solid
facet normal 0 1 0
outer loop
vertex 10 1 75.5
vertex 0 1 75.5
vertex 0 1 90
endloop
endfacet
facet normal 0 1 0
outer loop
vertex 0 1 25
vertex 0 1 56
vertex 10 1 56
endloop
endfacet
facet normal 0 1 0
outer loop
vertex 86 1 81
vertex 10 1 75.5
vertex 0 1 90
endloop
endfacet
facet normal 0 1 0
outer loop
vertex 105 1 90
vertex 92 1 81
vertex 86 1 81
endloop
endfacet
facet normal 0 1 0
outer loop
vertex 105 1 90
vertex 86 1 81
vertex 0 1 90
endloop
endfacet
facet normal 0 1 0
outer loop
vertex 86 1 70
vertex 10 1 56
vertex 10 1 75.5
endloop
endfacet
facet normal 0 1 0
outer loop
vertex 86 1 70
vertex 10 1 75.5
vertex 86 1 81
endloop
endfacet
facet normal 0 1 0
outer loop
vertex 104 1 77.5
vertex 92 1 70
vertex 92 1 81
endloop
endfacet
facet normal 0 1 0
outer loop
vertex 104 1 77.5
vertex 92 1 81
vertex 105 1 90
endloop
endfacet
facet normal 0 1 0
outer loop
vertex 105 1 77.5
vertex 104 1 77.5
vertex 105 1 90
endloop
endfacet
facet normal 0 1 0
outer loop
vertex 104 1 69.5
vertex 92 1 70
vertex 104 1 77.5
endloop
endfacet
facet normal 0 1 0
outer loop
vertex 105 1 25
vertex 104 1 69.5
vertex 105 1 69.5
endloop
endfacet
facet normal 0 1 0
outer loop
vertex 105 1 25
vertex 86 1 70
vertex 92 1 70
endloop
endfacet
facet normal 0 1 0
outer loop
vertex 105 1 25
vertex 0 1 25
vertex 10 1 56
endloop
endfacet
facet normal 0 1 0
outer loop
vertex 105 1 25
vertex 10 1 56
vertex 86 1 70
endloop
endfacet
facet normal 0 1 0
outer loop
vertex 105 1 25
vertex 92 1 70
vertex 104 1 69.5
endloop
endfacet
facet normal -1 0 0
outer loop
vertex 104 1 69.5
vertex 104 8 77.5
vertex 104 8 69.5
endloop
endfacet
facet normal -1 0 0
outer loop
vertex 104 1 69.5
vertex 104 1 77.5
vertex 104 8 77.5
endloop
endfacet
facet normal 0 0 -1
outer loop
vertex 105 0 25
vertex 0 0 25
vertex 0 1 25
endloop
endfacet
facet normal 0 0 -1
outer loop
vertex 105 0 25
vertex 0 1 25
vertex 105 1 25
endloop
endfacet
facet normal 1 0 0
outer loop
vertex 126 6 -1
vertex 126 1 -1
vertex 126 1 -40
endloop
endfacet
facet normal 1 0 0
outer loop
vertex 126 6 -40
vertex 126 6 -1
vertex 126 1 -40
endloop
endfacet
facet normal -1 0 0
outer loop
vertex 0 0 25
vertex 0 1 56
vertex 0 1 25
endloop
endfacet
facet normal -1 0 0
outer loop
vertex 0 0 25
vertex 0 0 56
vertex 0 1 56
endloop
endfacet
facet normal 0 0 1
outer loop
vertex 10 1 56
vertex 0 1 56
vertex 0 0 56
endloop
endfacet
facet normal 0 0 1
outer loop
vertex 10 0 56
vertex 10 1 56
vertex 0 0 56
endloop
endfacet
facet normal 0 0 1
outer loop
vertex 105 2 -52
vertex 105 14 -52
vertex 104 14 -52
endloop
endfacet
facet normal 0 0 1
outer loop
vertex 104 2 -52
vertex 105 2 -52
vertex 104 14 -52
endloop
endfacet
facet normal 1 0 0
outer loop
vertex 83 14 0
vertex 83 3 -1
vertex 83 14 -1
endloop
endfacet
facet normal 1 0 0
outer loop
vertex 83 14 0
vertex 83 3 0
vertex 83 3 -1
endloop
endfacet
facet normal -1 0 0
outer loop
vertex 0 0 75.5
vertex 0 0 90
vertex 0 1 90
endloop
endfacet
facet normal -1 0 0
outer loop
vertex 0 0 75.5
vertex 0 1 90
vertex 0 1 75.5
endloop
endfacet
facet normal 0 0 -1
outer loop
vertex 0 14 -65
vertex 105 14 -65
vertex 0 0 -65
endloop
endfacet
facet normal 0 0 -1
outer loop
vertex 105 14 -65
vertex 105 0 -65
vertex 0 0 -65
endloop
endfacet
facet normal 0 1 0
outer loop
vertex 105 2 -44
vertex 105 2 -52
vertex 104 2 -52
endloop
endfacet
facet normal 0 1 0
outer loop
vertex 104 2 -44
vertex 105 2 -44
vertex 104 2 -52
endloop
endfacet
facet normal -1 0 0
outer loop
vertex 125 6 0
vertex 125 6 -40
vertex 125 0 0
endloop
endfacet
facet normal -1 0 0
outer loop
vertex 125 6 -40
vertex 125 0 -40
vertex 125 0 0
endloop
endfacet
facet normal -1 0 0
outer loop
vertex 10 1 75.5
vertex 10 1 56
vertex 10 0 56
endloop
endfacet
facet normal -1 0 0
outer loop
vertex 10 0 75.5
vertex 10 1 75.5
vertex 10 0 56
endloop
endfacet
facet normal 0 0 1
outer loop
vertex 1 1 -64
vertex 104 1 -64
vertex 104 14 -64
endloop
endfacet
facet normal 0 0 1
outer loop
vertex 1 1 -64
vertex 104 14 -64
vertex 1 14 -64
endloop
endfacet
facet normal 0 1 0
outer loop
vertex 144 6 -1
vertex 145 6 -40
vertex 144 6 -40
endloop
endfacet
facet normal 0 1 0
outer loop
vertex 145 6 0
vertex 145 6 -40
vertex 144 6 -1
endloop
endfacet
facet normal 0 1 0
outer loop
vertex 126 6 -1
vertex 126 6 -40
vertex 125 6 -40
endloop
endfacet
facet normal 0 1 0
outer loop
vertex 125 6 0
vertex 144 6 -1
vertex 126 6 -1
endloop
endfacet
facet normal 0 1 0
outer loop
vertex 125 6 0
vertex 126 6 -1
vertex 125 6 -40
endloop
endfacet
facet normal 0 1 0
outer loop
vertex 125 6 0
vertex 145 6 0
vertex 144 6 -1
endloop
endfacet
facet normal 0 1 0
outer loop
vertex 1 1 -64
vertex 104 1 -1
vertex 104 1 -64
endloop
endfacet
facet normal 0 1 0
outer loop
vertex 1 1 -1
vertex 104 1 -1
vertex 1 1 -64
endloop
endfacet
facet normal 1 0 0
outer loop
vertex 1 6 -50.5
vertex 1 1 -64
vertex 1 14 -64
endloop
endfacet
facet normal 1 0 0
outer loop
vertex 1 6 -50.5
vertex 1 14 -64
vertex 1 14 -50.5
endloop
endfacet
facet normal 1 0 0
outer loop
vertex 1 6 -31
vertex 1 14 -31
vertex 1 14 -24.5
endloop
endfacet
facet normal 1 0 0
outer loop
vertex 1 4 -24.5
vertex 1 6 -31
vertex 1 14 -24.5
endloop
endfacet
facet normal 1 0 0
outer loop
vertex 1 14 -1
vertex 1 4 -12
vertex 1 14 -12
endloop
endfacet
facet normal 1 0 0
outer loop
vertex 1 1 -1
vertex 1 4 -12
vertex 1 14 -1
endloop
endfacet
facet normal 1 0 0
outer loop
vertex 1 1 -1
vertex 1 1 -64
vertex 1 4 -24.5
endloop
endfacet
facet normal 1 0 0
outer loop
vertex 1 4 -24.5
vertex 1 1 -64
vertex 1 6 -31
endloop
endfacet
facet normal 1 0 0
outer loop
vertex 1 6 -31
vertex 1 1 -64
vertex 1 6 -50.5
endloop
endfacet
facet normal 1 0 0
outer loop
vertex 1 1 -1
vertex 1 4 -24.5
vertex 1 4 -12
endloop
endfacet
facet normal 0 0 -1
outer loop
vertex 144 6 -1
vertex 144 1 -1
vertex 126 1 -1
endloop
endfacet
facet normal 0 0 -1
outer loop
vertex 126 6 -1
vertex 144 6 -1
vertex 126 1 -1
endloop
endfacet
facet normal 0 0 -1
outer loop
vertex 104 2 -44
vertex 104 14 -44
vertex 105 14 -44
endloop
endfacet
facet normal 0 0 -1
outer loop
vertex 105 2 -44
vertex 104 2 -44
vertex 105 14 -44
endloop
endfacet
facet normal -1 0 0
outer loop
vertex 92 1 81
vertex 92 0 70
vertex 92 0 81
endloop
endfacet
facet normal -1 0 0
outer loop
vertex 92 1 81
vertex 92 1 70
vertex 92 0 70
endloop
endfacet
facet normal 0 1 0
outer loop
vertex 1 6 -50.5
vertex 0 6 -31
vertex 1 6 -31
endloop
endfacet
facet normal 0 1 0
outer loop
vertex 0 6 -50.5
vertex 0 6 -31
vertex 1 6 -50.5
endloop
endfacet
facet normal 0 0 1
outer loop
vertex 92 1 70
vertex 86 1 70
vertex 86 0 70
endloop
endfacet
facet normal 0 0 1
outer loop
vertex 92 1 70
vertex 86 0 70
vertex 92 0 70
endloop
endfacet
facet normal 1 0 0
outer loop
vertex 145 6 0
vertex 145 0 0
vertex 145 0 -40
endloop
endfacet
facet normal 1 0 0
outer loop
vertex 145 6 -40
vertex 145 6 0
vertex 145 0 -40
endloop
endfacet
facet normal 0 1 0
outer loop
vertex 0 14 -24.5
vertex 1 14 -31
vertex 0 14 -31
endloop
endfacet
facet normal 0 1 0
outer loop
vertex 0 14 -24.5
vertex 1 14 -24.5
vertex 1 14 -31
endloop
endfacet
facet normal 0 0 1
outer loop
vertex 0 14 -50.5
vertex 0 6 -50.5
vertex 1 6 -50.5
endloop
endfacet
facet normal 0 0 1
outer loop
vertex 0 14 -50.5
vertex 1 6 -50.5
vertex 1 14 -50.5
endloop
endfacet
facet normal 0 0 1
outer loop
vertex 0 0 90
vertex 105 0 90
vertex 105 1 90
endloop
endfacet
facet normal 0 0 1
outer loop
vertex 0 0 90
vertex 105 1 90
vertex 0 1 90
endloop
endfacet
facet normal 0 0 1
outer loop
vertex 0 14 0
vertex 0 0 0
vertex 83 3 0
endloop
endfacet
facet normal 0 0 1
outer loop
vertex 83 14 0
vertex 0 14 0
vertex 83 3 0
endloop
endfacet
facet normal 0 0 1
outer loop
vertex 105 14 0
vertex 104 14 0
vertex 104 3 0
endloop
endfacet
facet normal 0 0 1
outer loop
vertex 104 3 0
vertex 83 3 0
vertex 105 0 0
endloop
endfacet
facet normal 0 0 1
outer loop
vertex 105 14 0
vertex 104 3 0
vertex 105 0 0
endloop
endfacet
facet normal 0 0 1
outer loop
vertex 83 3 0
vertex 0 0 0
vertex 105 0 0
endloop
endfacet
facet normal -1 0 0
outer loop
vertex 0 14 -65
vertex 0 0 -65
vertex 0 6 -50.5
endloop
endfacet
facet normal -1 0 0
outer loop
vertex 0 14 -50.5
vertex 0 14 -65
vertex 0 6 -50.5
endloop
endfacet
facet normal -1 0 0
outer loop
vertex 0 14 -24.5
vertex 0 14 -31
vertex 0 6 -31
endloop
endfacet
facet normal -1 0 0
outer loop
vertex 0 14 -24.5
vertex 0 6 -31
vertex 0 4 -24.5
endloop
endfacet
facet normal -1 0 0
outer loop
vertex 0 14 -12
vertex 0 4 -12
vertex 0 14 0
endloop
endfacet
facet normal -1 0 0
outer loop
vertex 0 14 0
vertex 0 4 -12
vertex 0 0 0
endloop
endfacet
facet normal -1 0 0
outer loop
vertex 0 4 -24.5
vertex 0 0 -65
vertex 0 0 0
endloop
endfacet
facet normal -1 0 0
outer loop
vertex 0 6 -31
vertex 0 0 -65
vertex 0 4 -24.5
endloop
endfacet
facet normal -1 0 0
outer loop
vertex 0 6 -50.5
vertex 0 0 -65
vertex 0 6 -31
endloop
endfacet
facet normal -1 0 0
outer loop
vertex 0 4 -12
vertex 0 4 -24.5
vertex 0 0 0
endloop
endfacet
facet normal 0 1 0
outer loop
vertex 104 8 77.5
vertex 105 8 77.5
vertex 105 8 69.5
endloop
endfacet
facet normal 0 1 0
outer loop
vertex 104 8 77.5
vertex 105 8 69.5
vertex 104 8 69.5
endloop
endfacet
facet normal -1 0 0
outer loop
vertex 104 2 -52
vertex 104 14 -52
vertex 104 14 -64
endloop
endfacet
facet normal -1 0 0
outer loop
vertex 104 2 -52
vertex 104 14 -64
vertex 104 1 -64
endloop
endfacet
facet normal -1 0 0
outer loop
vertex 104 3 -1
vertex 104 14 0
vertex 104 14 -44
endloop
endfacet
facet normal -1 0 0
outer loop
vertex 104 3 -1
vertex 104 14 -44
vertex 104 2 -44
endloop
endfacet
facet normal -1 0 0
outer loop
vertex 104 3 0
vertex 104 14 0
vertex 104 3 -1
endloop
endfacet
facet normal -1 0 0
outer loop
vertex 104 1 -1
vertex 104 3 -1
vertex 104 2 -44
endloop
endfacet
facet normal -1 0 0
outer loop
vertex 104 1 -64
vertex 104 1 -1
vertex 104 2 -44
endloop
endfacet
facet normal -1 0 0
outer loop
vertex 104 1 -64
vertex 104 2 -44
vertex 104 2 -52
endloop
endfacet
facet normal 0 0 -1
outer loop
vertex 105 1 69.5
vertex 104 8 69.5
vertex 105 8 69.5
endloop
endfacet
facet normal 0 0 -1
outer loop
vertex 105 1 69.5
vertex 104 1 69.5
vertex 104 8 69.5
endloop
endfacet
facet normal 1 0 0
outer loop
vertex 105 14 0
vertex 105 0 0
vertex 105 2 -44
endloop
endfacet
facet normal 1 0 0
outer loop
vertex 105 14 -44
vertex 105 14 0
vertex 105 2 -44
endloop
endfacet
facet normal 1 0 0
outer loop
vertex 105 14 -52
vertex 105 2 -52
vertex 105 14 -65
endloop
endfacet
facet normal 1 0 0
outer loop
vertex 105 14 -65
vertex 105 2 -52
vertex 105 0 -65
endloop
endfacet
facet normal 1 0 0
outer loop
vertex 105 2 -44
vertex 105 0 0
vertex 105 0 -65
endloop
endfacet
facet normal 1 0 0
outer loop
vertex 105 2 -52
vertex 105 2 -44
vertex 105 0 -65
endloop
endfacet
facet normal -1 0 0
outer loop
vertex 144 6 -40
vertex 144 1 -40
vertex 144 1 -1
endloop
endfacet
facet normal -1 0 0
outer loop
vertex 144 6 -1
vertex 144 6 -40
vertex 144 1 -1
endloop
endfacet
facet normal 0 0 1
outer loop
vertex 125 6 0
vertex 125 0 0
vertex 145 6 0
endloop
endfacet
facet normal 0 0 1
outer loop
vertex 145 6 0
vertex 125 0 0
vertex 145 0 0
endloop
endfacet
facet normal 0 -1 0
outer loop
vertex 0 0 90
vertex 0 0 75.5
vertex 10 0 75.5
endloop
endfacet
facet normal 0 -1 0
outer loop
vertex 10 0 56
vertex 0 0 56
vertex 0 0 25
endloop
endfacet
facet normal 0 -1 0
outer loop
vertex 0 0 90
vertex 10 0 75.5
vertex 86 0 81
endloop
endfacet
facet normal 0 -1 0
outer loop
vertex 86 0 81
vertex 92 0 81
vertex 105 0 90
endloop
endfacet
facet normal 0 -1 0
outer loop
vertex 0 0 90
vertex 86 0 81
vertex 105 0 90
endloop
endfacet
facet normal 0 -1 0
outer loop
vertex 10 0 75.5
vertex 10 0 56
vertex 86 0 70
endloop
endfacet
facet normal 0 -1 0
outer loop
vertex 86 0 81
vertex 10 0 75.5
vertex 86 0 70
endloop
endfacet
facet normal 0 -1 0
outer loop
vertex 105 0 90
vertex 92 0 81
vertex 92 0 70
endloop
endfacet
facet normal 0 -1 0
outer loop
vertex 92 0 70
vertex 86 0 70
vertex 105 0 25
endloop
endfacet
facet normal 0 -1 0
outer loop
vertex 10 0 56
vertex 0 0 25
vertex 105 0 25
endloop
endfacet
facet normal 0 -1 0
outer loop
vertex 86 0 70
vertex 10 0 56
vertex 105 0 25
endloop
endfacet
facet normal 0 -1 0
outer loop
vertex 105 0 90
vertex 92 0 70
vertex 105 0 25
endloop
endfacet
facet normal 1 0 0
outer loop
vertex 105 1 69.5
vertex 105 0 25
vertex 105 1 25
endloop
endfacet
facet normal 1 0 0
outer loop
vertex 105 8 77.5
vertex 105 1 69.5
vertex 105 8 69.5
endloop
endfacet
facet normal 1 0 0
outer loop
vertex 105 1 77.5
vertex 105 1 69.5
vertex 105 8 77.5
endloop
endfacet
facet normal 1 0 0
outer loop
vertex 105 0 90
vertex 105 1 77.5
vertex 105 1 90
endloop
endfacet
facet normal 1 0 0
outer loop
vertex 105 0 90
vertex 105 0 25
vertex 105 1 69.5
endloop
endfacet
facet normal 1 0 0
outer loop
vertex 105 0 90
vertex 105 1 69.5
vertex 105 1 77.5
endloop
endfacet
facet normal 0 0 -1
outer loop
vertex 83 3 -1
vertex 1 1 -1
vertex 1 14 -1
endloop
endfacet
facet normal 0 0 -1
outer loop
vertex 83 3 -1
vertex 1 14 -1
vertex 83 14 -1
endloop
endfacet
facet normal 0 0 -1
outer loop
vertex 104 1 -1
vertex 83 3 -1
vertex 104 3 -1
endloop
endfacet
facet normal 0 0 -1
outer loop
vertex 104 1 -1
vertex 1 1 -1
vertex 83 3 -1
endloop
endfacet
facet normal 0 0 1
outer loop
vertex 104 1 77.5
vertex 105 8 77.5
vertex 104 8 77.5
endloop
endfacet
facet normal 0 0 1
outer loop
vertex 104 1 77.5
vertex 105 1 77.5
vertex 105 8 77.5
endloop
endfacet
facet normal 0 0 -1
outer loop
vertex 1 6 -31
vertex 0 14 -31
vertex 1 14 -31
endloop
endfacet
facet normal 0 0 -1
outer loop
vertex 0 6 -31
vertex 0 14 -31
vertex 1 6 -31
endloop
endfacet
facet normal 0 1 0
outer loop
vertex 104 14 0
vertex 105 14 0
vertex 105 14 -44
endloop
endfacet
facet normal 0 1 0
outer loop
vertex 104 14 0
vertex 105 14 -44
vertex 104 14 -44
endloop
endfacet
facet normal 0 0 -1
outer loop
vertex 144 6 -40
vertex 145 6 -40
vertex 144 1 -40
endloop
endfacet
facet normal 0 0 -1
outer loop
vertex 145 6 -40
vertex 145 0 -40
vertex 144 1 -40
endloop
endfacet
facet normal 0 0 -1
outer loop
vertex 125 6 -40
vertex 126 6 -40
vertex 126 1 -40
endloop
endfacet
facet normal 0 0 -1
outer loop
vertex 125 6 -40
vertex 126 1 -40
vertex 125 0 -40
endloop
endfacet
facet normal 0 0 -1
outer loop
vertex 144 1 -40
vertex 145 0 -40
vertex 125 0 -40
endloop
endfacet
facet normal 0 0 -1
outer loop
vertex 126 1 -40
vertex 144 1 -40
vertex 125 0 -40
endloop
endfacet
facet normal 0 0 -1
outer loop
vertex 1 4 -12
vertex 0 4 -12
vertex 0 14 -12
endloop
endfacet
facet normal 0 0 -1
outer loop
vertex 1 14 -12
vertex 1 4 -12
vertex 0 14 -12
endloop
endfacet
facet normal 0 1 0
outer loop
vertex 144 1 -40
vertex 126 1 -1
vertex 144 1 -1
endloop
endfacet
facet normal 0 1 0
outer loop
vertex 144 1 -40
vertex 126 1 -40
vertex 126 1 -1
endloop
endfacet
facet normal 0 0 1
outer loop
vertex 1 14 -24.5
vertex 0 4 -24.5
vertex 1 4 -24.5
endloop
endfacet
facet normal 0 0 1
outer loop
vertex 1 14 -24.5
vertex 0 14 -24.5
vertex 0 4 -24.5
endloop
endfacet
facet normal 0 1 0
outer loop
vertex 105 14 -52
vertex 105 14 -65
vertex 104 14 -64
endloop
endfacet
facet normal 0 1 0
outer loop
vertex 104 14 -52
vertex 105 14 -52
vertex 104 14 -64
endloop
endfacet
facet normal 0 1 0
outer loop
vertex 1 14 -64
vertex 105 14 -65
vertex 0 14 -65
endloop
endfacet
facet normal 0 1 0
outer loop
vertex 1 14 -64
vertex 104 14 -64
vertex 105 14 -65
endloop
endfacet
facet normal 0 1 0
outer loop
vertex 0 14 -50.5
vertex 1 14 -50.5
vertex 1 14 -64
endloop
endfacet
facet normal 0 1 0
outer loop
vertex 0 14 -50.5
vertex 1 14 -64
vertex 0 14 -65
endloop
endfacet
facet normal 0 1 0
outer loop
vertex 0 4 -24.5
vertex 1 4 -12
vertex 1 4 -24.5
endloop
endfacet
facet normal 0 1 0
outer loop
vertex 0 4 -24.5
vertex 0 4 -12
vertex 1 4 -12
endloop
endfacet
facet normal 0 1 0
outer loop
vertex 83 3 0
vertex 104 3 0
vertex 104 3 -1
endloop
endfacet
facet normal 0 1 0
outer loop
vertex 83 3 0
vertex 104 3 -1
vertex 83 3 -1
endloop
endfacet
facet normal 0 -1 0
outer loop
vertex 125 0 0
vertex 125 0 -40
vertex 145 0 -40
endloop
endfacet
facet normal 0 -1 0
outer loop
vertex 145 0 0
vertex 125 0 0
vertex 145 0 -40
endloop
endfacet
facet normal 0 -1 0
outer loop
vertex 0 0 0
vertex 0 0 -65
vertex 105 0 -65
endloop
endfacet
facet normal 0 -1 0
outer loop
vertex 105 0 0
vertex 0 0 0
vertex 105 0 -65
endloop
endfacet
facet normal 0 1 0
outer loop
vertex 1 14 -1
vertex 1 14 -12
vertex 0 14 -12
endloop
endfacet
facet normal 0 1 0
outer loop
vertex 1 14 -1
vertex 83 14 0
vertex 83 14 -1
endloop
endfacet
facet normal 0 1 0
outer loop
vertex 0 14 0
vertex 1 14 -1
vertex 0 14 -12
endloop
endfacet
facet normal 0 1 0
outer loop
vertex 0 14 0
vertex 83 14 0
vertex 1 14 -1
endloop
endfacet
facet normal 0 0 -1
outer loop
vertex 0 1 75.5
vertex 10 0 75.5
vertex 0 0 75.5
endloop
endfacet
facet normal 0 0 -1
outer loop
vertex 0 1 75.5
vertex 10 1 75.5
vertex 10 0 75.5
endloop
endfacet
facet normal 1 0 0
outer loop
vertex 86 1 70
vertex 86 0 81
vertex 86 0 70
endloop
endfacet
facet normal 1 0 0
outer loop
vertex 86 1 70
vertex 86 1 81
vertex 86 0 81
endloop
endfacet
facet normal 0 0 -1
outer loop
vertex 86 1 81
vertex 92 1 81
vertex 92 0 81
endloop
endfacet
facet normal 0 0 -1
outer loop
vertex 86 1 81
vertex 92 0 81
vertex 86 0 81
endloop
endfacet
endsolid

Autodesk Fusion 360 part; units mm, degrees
sketch "草图1" plane through (0, 0, 0) normal (0, 1, 0) x (1, 0, 0)
  line L0 (0, 0) -> (105, 0)
  line L1 (105, 0) -> (105, 65)
  line L2 (105, 65) -> (0, 65)
  line L3 (0, 65) -> (0, 0)
extrude "拉伸1" add sketch "草图1" along normal blind 1 makes body 1
sketch "草图2" plane through (0, 1, 0) normal (0, 1, 0) x (-1, 0, 0)
  line L0 (0, -65) -> (0, 0)
  line L1 (0, 0) -> (-105, 0)
  line L2 (-105, 0) -> (-105, -65)
  line L3 (-105, -65) -> (0, -65)
  line L4 (-1, -1) -> (-104, -1)
  line L5 (-104, -1) -> (-104, -64)
  line L6 (-104, -64) -> (-1, -64)
  line L7 (-1, -64) -> (-1, -1)
extrude "拉伸2" add sketch "草图2" along normal blind 13 bodies 1
sketch "草图3" plane through (0, 0, 0) normal (0, 0, 1) x (1, 0, 0)
  line L0 (0, 0) -> (105, 0)
  line L1 (105, 0) -> (105, 14)
  line L2 (105, 14) -> (0, 14)
  line L3 (0, 14) -> (0, 0)
  line L4 (104, 1) -> (83, 1)
  line L5 (83, 1) -> (83, 14)
  line L6 (83, 14) -> (104, 14)
  line L7 (104, 14) -> (104, 1)
  dimension "d5" = 21
extrude "拉伸3" cut sketch "草图3" against normal blind 1 contours L2 L4 L5 L6 L7 bodies 1
sketch "草图4" plane through (0, 0, 0) normal (-1, 0, 0) x (0, 0, 1)
  line L0 (-65, 0) -> (0, 0)
  line L1 (0, 0) -> (0, 14)
  line L2 (0, 14) -> (-65, 14)
  line L3 (-65, 14) -> (-65, 0)
  line L4 (-12, 6) -> (-22, 6)
  line L5 (-22, 6) -> (-22, 11)
  line L6 (-22, 11) -> (-12, 11)
  line L7 (-12, 11) -> (-12, 6)
  line L8 (-22, 11) -> (-12, 11)
  line L9 (-12, 11) -> (-12, 14)
  line L10 (-12, 14) -> (-22, 14)
  line L11 (-22, 14) -> (-22, 11)
  line L12 (-31, 6) -> (-48, 6)
  line L13 (-48, 6) -> (-48, 14)
  line L14 (-48, 14) -> (-31, 14)
  line L15 (-31, 14) -> (-31, 6)
extrude "拉伸4" cut sketch "草图4" against normal blind 1 contours L2 L12 L13 L14 L15 | L2 L6 L8 L9 L10 L11 | L4 L5 L6 L7 L8 bodies 1
sketch "草图5" plane through (0, 0, 0) normal (0, 1, 0) x (1, 0, 0)
  line L0 (0, -25) -> (105, -25)
  line L1 (105, -25) -> (105, -90)
  line L2 (105, -90) -> (0, -90)
  line L3 (0, -90) -> (0, -25)
extrude "拉伸5" add sketch "草图5" along normal blind 1 separate body makes body 2
sketch "草图6" plane through (0, 1, 0) normal (0, 1, 0) x (-1, 0, 0)
  line L0 (0, 90) -> (-105, 90)
  line L1 (-105, 90) -> (-105, 25)
  line L2 (-105, 25) -> (0, 25)
  line L3 (0, 25) -> (0, 90)
  line L4 (-103.5, 26) -> (-83.5, 26)
  line L5 (-83.5, 26) -> (-83.5, 25)
  line L6 (-83.5, 25) -> (-103.5, 25)
  line L7 (-103.5, 25) -> (-103.5, 26)
  line L8 (0, 47) -> (0, 37)
  line L9 (-1, 46.5) -> (0, 46.5)
  line L10 (0, 46.5) -> (0, 37.5)
  line L11 (0, 37.5) -> (-1, 37.5)
  line L12 (-1, 37.5) -> (-1, 46.5)
  line L13 (0, 56) -> (-9, 56)
  line L14 (-9, 56) -> (-9, 73)
  line L15 (-9, 73) -> (0, 73)
  line L16 (0, 73) -> (0, 56)
  dimension "d13" = 20
extrude "拉伸7" cut sketch "草图6" against normal blind 1 contours L3 L13 L14 L15 L16 bodies 2
extrude "拉伸8" add sketch "草图6" along normal blind 2 contours L3 L8 L9 L10 L11 L12 bodies 2
sketch "草图7" plane through (0, 14, 0) normal (0, 1, 0) x (-1, 0, 0)
  line L0 (0, -48) -> (-1, -48)
  line L1 (-1, -48) -> (-1, -64)
  line L2 (-1, -64) -> (-104, -64)
  line L3 (-104, -64) -> (-104, 0)
  line L4 (-104, 0) -> (-105, 0)
  line L5 (-105, 0) -> (-105, -65)
  line L6 (-105, -65) -> (0, -65)
  line L7 (0, -65) -> (0, -48)
  line L8 (-105, -52) -> (-104, -52)
  line L9 (-104, -52) -> (-104, -44)
  line L10 (-104, -44) -> (-105, -44)
  line L11 (-105, -44) -> (-105, -52)
extrude "拉伸9" cut sketch "草图7" against normal blind 12 contours L3 L5 L8 L9 L10 L11 bodies 1
sketch "草图8" plane through (0, 1, 0) normal (0, 1, 0) x (-1, 0, 0)
  line L0 (-105, 77.5) -> (-104, 77.5)
  line L1 (-104, 77.5) -> (-104, 69.5)
  line L2 (-104, 69.5) -> (-105, 69.5)
  line L3 (-105, 69.5) -> (-105, 77.5)
extrude "拉伸10" add sketch "草图8" along normal blind 7 bodies 2
sketch "草图9" plane through (0, 1, 0) normal (0, 1, 0) x (-1, 0, 0)
  line L0 (-94, 83) -> (-89, 83)
  line L1 (-89, 83) -> (-89, 73)
  line L2 (-89, 73) -> (-94, 73)
  line L3 (-94, 73) -> (-94, 83)
sketch "草图10" plane through (0, 0, 0) normal (0, 1, 0) x (1, 0, 0)
  line L0 (125, 0) -> (145, 0)
  line L1 (145, 0) -> (145, 40)
  line L2 (145, 40) -> (125, 40)
  line L3 (125, 40) -> (125, 0)
extrude "拉伸12" add sketch "草图10" along normal blind 1 separate body makes body 3
sketch "草图11" plane through (0, 1, 0) normal (0, 1, 0) x (-1, 0, 0)
  line L0 (-125, -40) -> (-125, 0)
  line L1 (-125, 0) -> (-145, 0)
  line L2 (-145, 0) -> (-145, -40)
  line L3 (-145, -40) -> (-125, -40)
  line L4 (-144, -1) -> (-126, -1)
  line L5 (-126, -1) -> (-126, -40)
  line L6 (-126, -40) -> (-144, -40)
  line L7 (-144, -40) -> (-144, -1)
  dimension "d28" = 18
extrude "拉伸13" add sketch "草图11" along normal blind 5 contours L0 L1 L2 L3 L4 L5 L7 bodies 3
sketch "草图12" plane through (0, 1, 0) normal (0, 1, 0) x (-1, 0, 0)
  line L0 (-1, -1) -> (-83, -1)
  line L1 (-83, -1) -> (-83, 0)
  line L2 (-83, 0) -> (-104, 0)
  line L3 (-104, 0) -> (-104, -64)
  line L4 (-104, -64) -> (-1, -64)
  line L5 (-1, -64) -> (-1, -1)
  line L6 (-83, -1) -> (-104, -1)
  line L7 (-104, -1) -> (-104, 0)
  line L8 (-104, 0) -> (-83, 0)
  line L9 (-83, 0) -> (-83, -1)
extrude "拉伸14" add sketch "草图12" along normal blind 2 contours L1 L2 L3 L6 L7 L8 L9 bodies 1
sketch "草图13" plane through (0, 1, 0) normal (0, 1, 0) x (-1, 0, 0)
  line L0 (-86, 70) -> (-92, 70)
  line L1 (-92, 70) -> (-92, 81)
  line L2 (-92, 81) -> (-86, 81)
  line L3 (-86, 81) -> (-86, 70)
extrude "拉伸15" cut sketch "草图13" against normal blind 1 bodies 2
extrude "拉伸16" cut 1 faces at (0.3333, 8.6667, -48) along direction (0, 0, -1) blind 2.5 on bodies 1 bodies 1
extrude "拉伸17" cut 1 faces at (0.3333, 11.3333, -22) along direction (0, 0, -1) blind 2.5 on bodies 1 bodies 1
extrude "拉伸18" cut 1 faces at (0.3333, 6, -16.1667) along direction (0, -1, 0) blind 2 on bodies 1 bodies 1
extrude "拉伸19" add 1 faces at (0.6667, 1.6667, 46.5) along direction (0, 0, 1) blind 2.5 on bodies 2 bodies 2
extrude "拉伸20" cut 1 faces at (6, 0.6667, 73) along direction (0, 0, 1) blind 2.5 on bodies 2 bodies 2
extrude "拉伸21" cut 1 faces at (9, 0.3333, 69) along direction (1, 0, 0) blind 1 on bodies 2 bodies 2
extrude "拉伸22" cut 1 faces at (0.3333, 3, 45.1667) along direction (0, -1, 0) blind 2 on bodies 2 bodies 2
